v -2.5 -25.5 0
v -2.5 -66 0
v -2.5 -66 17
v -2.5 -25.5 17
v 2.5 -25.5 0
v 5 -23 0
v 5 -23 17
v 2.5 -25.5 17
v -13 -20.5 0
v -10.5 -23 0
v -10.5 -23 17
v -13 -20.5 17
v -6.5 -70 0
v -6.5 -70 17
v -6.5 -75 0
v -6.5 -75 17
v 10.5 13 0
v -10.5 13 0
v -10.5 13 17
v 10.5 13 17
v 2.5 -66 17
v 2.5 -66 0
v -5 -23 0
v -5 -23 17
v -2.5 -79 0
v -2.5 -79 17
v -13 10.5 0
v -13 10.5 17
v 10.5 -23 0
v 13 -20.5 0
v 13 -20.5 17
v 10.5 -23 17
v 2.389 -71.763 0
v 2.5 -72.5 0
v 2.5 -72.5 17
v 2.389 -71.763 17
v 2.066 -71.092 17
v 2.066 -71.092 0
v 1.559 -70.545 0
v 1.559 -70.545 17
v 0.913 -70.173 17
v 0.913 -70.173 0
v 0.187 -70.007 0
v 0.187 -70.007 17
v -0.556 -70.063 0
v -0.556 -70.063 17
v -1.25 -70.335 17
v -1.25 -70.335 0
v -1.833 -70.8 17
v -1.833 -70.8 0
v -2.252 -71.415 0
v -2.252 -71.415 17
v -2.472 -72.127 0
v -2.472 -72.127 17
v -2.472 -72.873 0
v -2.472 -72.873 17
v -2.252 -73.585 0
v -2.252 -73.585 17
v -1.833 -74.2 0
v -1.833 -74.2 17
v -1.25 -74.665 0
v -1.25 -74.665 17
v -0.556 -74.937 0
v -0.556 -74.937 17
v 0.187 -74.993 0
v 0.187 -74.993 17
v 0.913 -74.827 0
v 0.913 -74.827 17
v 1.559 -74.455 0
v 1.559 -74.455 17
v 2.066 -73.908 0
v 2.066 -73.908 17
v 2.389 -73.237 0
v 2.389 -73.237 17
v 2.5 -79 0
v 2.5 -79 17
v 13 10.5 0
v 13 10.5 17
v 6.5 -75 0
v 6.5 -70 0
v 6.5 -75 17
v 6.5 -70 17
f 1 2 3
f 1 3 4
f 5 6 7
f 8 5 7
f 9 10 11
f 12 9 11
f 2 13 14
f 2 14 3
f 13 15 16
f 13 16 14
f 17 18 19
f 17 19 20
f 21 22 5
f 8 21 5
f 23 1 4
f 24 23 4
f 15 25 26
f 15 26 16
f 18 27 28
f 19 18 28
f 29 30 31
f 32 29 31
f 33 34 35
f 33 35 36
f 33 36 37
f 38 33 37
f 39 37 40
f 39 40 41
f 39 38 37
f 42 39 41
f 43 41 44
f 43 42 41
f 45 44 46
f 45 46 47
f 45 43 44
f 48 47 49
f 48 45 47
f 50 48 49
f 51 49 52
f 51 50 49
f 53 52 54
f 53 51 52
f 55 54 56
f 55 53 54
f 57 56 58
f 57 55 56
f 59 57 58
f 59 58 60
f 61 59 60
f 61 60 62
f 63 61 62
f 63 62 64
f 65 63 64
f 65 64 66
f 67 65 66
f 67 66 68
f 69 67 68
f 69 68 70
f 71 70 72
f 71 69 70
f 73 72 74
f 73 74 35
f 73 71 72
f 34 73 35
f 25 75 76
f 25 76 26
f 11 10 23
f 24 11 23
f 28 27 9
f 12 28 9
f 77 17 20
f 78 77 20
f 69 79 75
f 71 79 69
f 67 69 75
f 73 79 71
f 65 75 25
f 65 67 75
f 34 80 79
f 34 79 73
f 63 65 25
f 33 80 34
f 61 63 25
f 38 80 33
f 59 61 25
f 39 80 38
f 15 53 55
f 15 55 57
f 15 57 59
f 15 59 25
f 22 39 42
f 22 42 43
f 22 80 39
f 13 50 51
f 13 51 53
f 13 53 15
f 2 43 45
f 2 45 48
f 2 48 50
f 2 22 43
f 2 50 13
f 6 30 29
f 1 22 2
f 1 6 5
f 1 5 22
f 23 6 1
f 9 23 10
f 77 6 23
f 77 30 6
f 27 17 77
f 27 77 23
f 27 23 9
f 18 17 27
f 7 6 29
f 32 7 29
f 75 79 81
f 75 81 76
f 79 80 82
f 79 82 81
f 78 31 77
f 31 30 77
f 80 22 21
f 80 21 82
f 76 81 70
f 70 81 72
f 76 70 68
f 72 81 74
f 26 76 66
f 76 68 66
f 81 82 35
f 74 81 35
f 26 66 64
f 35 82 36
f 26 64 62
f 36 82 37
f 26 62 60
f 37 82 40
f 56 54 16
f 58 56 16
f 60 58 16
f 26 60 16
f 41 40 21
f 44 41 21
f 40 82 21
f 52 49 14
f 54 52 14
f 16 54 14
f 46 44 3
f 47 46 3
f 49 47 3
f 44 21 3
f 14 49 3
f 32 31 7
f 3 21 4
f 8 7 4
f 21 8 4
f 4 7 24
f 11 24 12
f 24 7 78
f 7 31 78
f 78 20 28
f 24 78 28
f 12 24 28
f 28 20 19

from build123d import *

# Parameters (mm, degrees)
SKETCH1_W           = 26
SKETCH1_H           = 26
SKETCH1_W_2         = 5
SKETCH1_H_2         = 43
SKETCH1_R           = 2.5
BOSS_EXTRUDE1_DEPTH = 17
CHAMFER1_SIZE       = 2.5


with BuildPart() as part:
    # Sketch1 → Boss-Extrude1 (new body)
    # profile 1 of 4: a face of its own
    with BuildSketch(Plane.XY):
        Rectangle(SKETCH1_W, SKETCH1_H)
    # profile 2 of 4: a face of its own
    with BuildSketch(Plane.XY):
        Polygon((-2.5, -23), (2.5, -23), (13, -23), (13, -13), (-13, -13), (-13, -23), align=None)
    # profile 3 of 4: a face of its own
    with BuildSketch(Plane.XY):
        with Locations((0, -44.5)):
            Rectangle(SKETCH1_W_2, SKETCH1_H_2)
    # profile 4 of 4: a face of its own
    with BuildSketch(Plane.XY):
        Polygon((6.5, -70), (6.5, -75), (2.5, -79), (-2.5, -79), (-6.5, -75), (-6.5, -70), (-2.5, -66), (2.5, -66), align=None)
        with Locations((0, -72.5)):
            Circle(SKETCH1_R, mode=Mode.SUBTRACT)
    extrude(amount=BOSS_EXTRUDE1_DEPTH)

    # Chamfer1
    chamfer1_edges = [part.edges().sort_by_distance(p)[0] for p in [
        (-13, 13, 8.5),
        (13, 13, 8.5),
        (13, -23, 8.5),
        (2.5, -23, 8.5),
        (-2.5, -23, 8.5),
        (-13, -23, 8.5),
    ]]
    chamfer(chamfer1_edges, length=CHAMFER1_SIZE)


solid = part.part
